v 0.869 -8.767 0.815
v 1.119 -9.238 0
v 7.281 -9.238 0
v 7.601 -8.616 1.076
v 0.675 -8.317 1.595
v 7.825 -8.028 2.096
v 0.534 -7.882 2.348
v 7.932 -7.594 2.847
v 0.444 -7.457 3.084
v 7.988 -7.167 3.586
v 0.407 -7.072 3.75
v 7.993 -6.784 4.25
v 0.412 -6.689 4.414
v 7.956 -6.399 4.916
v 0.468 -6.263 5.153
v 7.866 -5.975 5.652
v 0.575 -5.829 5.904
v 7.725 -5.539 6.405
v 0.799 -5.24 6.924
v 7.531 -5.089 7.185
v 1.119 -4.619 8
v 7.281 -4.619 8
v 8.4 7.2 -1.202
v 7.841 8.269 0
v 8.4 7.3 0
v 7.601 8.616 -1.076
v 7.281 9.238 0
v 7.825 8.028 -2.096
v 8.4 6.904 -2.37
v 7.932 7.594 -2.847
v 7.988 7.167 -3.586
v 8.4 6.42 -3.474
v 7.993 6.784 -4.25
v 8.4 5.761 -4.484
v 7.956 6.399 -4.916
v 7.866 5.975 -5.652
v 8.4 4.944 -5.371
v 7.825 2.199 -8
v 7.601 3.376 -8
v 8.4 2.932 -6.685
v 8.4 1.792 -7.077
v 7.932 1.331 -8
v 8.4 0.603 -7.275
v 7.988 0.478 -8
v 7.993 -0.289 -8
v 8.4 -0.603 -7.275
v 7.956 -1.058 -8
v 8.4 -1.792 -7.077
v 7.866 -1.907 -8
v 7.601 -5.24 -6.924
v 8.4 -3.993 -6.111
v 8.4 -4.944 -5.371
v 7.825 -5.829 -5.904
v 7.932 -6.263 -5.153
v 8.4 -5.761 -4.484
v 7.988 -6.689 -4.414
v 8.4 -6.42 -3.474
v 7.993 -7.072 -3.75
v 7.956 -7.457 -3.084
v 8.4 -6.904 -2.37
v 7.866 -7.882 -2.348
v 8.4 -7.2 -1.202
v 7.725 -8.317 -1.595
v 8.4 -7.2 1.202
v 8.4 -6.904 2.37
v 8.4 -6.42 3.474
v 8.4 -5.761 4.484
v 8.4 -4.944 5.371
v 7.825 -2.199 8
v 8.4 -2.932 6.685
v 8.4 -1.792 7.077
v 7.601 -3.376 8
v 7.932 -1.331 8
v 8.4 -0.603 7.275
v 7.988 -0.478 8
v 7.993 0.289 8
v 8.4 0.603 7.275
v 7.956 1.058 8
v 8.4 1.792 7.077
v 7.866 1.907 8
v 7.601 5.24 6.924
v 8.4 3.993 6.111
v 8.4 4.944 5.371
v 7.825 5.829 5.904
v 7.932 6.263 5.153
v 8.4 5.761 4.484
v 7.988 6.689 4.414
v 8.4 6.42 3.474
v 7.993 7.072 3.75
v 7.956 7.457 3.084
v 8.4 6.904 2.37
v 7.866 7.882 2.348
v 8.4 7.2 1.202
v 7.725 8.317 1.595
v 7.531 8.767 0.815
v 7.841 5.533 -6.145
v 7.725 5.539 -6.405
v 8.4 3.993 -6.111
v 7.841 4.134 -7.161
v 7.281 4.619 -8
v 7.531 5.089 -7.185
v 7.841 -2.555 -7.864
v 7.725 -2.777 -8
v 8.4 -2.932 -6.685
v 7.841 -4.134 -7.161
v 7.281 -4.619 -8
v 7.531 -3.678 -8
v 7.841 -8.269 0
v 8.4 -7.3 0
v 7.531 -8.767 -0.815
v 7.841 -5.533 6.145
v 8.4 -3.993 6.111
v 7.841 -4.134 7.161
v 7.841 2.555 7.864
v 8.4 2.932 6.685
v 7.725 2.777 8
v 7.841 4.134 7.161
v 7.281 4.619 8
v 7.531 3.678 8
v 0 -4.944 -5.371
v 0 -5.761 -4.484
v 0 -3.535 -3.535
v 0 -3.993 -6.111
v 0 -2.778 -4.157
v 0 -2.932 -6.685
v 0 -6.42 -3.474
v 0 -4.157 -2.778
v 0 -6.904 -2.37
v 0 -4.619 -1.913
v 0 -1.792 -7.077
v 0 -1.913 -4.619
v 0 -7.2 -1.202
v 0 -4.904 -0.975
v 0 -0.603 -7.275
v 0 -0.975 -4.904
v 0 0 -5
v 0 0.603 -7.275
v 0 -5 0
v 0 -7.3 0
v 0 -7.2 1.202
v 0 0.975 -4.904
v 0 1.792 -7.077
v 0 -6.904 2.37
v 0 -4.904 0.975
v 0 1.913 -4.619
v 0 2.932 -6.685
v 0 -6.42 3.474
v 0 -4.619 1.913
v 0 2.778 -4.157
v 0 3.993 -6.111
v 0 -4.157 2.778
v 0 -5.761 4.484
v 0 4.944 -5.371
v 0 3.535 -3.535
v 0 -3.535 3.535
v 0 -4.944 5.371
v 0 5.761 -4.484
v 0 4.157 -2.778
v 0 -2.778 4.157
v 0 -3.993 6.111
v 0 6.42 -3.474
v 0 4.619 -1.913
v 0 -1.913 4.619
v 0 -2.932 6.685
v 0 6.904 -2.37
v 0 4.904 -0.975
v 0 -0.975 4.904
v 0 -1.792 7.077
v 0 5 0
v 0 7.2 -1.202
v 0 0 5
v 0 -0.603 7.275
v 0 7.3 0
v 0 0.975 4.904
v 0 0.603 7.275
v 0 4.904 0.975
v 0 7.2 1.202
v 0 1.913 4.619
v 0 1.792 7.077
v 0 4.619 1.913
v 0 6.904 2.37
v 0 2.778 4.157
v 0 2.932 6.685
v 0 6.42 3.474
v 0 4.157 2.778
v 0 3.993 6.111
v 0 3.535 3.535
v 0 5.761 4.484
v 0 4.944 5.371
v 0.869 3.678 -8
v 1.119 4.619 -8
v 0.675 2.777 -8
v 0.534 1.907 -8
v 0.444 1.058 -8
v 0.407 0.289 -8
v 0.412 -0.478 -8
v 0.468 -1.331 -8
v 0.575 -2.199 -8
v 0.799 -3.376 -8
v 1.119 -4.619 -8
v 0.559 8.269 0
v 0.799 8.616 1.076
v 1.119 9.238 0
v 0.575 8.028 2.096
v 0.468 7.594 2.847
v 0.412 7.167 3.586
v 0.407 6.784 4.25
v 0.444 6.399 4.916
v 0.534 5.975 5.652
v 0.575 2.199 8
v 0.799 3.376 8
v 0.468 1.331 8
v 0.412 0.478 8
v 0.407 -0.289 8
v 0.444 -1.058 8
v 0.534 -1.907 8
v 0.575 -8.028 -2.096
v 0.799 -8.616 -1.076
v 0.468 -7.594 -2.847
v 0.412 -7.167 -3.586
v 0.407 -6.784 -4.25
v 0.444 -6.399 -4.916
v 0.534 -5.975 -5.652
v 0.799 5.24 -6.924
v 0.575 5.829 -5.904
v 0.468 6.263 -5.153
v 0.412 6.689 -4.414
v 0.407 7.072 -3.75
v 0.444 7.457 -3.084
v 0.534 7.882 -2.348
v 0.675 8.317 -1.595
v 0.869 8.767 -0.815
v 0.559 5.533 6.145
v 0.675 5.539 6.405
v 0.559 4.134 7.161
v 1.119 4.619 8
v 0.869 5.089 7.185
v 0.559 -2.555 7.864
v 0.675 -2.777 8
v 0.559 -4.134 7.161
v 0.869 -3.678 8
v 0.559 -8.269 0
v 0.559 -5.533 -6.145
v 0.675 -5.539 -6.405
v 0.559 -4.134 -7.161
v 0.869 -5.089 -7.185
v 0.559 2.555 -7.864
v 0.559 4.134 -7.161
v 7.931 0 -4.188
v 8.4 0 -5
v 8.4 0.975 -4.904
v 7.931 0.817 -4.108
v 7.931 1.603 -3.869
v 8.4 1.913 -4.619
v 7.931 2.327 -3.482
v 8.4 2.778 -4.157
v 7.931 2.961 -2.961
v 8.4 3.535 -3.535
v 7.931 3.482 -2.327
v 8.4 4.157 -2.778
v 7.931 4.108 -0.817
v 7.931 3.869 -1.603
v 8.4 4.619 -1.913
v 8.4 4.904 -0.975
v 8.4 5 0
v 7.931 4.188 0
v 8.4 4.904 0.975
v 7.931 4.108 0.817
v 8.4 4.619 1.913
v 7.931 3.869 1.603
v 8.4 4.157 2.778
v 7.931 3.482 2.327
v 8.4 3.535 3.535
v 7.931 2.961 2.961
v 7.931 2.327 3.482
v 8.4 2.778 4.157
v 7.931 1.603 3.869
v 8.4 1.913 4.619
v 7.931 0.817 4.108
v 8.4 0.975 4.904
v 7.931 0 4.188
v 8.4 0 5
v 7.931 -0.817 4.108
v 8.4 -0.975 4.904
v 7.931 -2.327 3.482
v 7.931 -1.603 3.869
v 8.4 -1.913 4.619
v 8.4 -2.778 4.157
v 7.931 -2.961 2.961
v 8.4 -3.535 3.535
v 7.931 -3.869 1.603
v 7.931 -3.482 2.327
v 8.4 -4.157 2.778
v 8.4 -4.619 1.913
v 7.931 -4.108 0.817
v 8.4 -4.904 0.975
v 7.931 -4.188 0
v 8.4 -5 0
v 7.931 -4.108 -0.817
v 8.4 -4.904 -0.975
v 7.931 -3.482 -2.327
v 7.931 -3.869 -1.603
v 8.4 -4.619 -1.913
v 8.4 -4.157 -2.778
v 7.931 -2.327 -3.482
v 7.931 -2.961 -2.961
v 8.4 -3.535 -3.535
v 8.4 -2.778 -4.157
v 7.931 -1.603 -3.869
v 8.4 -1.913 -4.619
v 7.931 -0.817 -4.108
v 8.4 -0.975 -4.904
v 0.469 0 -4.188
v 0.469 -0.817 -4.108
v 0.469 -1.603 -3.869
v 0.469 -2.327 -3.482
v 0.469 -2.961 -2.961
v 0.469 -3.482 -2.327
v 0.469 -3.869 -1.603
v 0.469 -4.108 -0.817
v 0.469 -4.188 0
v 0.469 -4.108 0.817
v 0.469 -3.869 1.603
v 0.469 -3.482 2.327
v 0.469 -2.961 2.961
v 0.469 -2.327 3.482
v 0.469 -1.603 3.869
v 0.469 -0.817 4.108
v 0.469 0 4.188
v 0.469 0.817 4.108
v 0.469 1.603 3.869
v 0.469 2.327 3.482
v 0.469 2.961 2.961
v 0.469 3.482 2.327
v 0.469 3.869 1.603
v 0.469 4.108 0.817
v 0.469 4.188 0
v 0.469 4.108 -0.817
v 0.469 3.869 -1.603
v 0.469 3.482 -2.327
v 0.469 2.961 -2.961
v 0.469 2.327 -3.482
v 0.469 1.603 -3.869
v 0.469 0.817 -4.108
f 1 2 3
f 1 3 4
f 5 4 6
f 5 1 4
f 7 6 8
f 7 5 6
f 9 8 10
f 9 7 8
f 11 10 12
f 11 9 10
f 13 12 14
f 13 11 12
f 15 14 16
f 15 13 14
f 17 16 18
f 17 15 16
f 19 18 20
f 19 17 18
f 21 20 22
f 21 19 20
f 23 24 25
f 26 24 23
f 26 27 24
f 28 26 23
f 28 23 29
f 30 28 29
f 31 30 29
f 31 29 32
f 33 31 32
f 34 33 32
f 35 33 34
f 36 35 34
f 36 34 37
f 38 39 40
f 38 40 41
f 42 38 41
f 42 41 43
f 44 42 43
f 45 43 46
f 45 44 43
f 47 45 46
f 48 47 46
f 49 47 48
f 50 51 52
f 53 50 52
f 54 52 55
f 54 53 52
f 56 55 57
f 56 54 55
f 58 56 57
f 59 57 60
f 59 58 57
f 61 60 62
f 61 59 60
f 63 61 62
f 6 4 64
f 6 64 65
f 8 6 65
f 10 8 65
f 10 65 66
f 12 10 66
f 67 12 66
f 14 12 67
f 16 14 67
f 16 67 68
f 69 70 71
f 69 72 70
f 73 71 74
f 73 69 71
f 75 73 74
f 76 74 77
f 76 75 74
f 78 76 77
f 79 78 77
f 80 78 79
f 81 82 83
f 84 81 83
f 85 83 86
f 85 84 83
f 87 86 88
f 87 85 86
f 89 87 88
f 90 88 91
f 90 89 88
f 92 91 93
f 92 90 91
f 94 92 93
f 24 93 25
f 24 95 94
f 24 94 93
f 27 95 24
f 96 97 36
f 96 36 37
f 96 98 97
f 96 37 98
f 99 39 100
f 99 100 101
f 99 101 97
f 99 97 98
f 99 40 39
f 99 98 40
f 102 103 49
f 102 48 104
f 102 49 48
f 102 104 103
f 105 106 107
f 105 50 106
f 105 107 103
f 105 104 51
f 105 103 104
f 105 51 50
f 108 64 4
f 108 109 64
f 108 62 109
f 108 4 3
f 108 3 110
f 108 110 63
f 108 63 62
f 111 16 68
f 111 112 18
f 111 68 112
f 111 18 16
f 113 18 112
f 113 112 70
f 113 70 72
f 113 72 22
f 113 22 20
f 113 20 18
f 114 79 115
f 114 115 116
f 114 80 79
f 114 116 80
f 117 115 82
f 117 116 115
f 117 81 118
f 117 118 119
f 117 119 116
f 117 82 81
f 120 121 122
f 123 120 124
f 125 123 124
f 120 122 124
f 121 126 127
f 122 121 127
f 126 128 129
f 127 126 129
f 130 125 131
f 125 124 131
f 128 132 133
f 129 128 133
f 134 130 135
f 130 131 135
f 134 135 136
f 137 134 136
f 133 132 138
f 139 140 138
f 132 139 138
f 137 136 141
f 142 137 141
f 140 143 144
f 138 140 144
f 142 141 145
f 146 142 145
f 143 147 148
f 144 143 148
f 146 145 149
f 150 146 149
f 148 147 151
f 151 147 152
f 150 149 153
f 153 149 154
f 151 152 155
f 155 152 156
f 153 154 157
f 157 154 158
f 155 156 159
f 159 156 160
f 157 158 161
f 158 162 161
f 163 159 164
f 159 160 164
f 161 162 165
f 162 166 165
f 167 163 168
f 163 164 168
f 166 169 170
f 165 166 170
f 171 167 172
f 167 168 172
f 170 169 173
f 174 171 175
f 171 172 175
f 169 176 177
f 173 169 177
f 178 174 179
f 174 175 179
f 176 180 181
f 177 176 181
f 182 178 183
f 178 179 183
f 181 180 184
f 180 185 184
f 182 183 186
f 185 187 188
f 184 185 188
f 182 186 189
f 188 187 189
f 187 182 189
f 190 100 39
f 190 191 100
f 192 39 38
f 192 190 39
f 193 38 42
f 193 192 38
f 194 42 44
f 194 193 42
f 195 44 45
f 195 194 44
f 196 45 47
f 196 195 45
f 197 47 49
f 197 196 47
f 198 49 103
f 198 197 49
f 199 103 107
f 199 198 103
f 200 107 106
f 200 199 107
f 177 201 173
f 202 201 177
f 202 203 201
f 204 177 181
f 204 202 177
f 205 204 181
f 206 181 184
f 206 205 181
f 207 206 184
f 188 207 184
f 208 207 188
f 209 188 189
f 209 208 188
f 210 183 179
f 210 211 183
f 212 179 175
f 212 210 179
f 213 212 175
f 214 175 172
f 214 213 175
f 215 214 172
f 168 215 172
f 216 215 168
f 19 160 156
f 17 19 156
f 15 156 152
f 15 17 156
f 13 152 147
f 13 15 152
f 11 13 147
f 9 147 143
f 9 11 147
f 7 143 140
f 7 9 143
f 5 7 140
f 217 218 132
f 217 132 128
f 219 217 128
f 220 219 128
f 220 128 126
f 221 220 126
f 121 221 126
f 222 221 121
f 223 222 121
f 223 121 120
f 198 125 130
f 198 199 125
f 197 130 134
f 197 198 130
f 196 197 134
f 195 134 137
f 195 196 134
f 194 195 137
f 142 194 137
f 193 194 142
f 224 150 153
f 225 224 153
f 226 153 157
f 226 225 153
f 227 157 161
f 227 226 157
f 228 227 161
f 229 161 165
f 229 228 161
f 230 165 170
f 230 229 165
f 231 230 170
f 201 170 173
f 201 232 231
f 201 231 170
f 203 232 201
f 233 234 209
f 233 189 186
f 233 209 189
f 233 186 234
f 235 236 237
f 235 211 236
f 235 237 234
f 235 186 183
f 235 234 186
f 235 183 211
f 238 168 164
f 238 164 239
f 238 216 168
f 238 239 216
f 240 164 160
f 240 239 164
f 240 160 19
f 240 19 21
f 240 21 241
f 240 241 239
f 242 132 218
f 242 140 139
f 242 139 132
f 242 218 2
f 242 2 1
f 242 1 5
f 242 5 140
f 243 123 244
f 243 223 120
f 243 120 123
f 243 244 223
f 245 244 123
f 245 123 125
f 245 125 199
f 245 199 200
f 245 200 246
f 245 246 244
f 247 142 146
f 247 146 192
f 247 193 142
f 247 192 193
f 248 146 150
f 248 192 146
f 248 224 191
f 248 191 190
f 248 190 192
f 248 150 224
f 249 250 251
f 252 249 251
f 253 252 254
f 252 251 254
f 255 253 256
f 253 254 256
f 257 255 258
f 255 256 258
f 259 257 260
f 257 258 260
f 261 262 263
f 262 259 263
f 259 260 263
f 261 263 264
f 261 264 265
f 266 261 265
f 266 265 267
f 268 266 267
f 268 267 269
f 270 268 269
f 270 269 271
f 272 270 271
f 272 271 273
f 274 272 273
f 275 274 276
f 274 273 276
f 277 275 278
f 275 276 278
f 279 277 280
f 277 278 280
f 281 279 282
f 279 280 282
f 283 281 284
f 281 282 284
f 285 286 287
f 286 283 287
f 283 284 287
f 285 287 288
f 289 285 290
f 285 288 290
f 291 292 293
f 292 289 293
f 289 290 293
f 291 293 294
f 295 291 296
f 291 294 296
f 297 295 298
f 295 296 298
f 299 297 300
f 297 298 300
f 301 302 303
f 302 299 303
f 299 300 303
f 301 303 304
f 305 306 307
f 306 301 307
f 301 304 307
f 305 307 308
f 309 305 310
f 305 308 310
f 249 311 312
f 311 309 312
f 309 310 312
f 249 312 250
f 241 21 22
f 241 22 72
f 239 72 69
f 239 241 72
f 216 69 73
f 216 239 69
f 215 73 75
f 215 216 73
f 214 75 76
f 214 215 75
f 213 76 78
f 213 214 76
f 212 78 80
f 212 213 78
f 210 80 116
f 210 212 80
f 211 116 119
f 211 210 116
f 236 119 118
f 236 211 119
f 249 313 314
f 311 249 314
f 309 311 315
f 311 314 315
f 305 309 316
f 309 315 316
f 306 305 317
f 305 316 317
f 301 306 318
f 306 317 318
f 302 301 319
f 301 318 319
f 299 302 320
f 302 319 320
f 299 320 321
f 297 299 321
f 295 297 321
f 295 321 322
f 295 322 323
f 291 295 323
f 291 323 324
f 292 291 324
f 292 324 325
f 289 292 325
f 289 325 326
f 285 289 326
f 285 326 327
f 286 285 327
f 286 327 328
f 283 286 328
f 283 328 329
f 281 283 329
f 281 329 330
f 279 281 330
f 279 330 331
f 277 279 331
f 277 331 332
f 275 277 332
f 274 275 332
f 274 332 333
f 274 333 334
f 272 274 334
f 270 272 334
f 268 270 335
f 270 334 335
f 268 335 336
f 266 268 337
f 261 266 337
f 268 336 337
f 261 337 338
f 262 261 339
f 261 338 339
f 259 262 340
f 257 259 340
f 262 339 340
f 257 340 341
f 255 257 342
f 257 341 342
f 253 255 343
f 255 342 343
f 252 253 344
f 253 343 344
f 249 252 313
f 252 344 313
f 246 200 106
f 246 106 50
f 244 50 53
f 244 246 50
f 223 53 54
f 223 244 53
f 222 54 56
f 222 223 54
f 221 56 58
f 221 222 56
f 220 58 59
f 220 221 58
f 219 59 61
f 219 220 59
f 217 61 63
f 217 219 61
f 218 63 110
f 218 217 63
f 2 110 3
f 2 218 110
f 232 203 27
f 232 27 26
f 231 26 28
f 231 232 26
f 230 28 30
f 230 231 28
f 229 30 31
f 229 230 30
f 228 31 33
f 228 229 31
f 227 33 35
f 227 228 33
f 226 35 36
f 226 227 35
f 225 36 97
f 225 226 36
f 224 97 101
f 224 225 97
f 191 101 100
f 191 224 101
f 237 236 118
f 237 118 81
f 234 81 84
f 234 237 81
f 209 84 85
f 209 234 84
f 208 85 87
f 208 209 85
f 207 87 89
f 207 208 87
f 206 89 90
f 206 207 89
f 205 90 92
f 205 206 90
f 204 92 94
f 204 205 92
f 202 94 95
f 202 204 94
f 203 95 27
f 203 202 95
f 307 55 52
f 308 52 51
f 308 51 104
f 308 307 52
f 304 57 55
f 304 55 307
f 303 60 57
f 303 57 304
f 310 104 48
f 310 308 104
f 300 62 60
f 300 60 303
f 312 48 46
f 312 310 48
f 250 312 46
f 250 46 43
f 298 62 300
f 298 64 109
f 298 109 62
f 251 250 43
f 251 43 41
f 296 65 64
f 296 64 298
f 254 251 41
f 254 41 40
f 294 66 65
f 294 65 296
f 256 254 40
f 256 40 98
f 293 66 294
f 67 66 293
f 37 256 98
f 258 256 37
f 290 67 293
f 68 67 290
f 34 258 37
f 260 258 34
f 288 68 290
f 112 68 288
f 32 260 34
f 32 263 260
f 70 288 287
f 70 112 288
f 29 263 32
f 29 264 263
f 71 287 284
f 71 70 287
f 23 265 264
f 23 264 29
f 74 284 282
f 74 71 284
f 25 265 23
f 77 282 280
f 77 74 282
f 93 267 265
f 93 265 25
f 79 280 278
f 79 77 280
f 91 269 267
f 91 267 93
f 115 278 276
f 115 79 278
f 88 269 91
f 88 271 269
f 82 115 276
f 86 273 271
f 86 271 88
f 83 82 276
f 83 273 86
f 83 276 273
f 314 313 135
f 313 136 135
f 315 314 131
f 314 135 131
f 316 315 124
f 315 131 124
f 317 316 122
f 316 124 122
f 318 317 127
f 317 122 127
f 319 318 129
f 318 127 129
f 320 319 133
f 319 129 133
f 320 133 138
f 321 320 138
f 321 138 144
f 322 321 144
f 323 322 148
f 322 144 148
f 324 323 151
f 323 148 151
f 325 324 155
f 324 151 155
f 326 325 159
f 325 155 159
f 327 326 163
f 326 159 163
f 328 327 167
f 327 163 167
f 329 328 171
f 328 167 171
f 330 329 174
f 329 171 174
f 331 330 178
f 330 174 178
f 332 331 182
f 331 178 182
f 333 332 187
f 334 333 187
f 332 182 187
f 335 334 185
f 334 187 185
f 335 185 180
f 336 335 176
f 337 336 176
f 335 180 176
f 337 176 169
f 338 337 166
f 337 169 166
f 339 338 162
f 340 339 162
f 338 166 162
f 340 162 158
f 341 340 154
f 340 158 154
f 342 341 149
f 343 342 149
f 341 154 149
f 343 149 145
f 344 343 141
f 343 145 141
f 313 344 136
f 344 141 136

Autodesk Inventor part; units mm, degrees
ref_plane "YZ Plane" through (0, 0, 0) normal (1, 0, 0) x (0, 1, 0)
ref_plane "XZ Plane" through (0, 0, 0) normal (0, 1, 0) x (-1, 0, 0)
sketch "Sketch1" plane through (0, 0, 0) normal (1, 0, 0) x (0, 1, 0)
  line L0 (-9.2376, 0) -> (-4.6188, 8)
  line L1 (-4.6188, 8) -> (4.6188, 8)
  line L2 (4.6188, 8) -> (9.2376, 0)
  line L3 (9.2376, 0) -> (4.6188, -8)
  line L4 (4.6188, -8) -> (-4.6188, -8)
  line L5 (-4.6188, -8) -> (-9.2376, 0)
  point P0 (0, 0)
  point P1 (0, 0)
  dimension "d0" = 18.4752
extrude "Body" add sketch "Sketch1" along normal blind 8.4
sketch "Sketch2" plane through (0, 0, 0) normal (0, 0, 1) x (1, 0, 0)
  line L0 (0, 4.6188) -> (0, 9.2376) projected
  line L1 (0, 9.2376) -> (8.4, 9.2376) projected
  line L2 (8.4, 4.6188) -> (8.4, 9.2376) projected
  line L3 (-1.68, 0) -> (10.08, 0) projected
  line L4 (1.1187, 9.2376) -> (0, 7.3)
  line L5 (7.2813, 9.2376) -> (8.4, 7.3)
  dimension "d3" = 30
  dimension "d4" = 30
  dimension "d5" = 14.6
  dimension "d6" = 14.6
revolve "Chamfer1" cut sketch "Sketch2" angle 360 about axis through (-10, 0, 0) along (1, 0, 0)
sketch "Sketch3" plane through (8.4, 0, 0) normal (1, 0, 0) x (0, 0, -1)
  arc A0 (-0.625, -1.0825) -> (0.625, -1.0825) centre (0, 0) ccw projected
hole "Thread" at (8.4, 0, 0) direction (-1, 0, 0) diameter 8.376 end through all thread size "M10x1.5" class "6H" standard "ISO Metric profile"
chamfer "Chamfer2" distance 0.8119 angle 30 1 edges at (8.4, 0, 4.188) measured on face at (8.4, 6.1818, -0.7506)
chamfer "Chamfer3" distance 0.8119 angle 30 1 edges at (0, 0, 4.188) measured on face at (0, 6.1818, -0.7506)
ref_plane "Work Plane1" through (-17.5863, 0, 0) normal (0, -0.866, -0.5) x (1, 0, 0)
equation "\"d0\" = 1.1547 * SW"
equation "\"d1\" = KOH"
equation "\"d3\" = ANG1"
equation "\"d4\" = ANG2"
equation "\"d5\" = SW0"
equation "\"d6\" = SW01"
equation "\"d8\" = -0.5 * GD1 + 0.5 * NND"
equation "\"d40\" = -0.5 * GD1 + 0.5 * NND"
equation "\"d10\" = -0.5 * GD1 + 0.5 * NND"
equation "\"d41\" = -0.5 * GD1 + 0.5 * NND"
equation "\"ANG1\" = 30deg"
equation "\"ANG2\" = 30deg"
equation "\"KOH\" = 8.4"
equation "\"SW\" = 16"
equation "\"SW0\" = 14.6"
equation "\"SW01\" = 14.6"
equation "\"GUL\" = 0.541266 * PTC"
equation "\"TOA\" = 30deg"
equation "\"PTC\" = 1.5"
equation "\"E0\" = 1.155 * SW"
equation "\"GAL\" = 0.541266 * PTC"
equation "\"GD1\" = 8.376202"
equation "\"NND\" = 10"
properties part number "ISO 4032 - M10" material "Stainless Steel, 440C"
